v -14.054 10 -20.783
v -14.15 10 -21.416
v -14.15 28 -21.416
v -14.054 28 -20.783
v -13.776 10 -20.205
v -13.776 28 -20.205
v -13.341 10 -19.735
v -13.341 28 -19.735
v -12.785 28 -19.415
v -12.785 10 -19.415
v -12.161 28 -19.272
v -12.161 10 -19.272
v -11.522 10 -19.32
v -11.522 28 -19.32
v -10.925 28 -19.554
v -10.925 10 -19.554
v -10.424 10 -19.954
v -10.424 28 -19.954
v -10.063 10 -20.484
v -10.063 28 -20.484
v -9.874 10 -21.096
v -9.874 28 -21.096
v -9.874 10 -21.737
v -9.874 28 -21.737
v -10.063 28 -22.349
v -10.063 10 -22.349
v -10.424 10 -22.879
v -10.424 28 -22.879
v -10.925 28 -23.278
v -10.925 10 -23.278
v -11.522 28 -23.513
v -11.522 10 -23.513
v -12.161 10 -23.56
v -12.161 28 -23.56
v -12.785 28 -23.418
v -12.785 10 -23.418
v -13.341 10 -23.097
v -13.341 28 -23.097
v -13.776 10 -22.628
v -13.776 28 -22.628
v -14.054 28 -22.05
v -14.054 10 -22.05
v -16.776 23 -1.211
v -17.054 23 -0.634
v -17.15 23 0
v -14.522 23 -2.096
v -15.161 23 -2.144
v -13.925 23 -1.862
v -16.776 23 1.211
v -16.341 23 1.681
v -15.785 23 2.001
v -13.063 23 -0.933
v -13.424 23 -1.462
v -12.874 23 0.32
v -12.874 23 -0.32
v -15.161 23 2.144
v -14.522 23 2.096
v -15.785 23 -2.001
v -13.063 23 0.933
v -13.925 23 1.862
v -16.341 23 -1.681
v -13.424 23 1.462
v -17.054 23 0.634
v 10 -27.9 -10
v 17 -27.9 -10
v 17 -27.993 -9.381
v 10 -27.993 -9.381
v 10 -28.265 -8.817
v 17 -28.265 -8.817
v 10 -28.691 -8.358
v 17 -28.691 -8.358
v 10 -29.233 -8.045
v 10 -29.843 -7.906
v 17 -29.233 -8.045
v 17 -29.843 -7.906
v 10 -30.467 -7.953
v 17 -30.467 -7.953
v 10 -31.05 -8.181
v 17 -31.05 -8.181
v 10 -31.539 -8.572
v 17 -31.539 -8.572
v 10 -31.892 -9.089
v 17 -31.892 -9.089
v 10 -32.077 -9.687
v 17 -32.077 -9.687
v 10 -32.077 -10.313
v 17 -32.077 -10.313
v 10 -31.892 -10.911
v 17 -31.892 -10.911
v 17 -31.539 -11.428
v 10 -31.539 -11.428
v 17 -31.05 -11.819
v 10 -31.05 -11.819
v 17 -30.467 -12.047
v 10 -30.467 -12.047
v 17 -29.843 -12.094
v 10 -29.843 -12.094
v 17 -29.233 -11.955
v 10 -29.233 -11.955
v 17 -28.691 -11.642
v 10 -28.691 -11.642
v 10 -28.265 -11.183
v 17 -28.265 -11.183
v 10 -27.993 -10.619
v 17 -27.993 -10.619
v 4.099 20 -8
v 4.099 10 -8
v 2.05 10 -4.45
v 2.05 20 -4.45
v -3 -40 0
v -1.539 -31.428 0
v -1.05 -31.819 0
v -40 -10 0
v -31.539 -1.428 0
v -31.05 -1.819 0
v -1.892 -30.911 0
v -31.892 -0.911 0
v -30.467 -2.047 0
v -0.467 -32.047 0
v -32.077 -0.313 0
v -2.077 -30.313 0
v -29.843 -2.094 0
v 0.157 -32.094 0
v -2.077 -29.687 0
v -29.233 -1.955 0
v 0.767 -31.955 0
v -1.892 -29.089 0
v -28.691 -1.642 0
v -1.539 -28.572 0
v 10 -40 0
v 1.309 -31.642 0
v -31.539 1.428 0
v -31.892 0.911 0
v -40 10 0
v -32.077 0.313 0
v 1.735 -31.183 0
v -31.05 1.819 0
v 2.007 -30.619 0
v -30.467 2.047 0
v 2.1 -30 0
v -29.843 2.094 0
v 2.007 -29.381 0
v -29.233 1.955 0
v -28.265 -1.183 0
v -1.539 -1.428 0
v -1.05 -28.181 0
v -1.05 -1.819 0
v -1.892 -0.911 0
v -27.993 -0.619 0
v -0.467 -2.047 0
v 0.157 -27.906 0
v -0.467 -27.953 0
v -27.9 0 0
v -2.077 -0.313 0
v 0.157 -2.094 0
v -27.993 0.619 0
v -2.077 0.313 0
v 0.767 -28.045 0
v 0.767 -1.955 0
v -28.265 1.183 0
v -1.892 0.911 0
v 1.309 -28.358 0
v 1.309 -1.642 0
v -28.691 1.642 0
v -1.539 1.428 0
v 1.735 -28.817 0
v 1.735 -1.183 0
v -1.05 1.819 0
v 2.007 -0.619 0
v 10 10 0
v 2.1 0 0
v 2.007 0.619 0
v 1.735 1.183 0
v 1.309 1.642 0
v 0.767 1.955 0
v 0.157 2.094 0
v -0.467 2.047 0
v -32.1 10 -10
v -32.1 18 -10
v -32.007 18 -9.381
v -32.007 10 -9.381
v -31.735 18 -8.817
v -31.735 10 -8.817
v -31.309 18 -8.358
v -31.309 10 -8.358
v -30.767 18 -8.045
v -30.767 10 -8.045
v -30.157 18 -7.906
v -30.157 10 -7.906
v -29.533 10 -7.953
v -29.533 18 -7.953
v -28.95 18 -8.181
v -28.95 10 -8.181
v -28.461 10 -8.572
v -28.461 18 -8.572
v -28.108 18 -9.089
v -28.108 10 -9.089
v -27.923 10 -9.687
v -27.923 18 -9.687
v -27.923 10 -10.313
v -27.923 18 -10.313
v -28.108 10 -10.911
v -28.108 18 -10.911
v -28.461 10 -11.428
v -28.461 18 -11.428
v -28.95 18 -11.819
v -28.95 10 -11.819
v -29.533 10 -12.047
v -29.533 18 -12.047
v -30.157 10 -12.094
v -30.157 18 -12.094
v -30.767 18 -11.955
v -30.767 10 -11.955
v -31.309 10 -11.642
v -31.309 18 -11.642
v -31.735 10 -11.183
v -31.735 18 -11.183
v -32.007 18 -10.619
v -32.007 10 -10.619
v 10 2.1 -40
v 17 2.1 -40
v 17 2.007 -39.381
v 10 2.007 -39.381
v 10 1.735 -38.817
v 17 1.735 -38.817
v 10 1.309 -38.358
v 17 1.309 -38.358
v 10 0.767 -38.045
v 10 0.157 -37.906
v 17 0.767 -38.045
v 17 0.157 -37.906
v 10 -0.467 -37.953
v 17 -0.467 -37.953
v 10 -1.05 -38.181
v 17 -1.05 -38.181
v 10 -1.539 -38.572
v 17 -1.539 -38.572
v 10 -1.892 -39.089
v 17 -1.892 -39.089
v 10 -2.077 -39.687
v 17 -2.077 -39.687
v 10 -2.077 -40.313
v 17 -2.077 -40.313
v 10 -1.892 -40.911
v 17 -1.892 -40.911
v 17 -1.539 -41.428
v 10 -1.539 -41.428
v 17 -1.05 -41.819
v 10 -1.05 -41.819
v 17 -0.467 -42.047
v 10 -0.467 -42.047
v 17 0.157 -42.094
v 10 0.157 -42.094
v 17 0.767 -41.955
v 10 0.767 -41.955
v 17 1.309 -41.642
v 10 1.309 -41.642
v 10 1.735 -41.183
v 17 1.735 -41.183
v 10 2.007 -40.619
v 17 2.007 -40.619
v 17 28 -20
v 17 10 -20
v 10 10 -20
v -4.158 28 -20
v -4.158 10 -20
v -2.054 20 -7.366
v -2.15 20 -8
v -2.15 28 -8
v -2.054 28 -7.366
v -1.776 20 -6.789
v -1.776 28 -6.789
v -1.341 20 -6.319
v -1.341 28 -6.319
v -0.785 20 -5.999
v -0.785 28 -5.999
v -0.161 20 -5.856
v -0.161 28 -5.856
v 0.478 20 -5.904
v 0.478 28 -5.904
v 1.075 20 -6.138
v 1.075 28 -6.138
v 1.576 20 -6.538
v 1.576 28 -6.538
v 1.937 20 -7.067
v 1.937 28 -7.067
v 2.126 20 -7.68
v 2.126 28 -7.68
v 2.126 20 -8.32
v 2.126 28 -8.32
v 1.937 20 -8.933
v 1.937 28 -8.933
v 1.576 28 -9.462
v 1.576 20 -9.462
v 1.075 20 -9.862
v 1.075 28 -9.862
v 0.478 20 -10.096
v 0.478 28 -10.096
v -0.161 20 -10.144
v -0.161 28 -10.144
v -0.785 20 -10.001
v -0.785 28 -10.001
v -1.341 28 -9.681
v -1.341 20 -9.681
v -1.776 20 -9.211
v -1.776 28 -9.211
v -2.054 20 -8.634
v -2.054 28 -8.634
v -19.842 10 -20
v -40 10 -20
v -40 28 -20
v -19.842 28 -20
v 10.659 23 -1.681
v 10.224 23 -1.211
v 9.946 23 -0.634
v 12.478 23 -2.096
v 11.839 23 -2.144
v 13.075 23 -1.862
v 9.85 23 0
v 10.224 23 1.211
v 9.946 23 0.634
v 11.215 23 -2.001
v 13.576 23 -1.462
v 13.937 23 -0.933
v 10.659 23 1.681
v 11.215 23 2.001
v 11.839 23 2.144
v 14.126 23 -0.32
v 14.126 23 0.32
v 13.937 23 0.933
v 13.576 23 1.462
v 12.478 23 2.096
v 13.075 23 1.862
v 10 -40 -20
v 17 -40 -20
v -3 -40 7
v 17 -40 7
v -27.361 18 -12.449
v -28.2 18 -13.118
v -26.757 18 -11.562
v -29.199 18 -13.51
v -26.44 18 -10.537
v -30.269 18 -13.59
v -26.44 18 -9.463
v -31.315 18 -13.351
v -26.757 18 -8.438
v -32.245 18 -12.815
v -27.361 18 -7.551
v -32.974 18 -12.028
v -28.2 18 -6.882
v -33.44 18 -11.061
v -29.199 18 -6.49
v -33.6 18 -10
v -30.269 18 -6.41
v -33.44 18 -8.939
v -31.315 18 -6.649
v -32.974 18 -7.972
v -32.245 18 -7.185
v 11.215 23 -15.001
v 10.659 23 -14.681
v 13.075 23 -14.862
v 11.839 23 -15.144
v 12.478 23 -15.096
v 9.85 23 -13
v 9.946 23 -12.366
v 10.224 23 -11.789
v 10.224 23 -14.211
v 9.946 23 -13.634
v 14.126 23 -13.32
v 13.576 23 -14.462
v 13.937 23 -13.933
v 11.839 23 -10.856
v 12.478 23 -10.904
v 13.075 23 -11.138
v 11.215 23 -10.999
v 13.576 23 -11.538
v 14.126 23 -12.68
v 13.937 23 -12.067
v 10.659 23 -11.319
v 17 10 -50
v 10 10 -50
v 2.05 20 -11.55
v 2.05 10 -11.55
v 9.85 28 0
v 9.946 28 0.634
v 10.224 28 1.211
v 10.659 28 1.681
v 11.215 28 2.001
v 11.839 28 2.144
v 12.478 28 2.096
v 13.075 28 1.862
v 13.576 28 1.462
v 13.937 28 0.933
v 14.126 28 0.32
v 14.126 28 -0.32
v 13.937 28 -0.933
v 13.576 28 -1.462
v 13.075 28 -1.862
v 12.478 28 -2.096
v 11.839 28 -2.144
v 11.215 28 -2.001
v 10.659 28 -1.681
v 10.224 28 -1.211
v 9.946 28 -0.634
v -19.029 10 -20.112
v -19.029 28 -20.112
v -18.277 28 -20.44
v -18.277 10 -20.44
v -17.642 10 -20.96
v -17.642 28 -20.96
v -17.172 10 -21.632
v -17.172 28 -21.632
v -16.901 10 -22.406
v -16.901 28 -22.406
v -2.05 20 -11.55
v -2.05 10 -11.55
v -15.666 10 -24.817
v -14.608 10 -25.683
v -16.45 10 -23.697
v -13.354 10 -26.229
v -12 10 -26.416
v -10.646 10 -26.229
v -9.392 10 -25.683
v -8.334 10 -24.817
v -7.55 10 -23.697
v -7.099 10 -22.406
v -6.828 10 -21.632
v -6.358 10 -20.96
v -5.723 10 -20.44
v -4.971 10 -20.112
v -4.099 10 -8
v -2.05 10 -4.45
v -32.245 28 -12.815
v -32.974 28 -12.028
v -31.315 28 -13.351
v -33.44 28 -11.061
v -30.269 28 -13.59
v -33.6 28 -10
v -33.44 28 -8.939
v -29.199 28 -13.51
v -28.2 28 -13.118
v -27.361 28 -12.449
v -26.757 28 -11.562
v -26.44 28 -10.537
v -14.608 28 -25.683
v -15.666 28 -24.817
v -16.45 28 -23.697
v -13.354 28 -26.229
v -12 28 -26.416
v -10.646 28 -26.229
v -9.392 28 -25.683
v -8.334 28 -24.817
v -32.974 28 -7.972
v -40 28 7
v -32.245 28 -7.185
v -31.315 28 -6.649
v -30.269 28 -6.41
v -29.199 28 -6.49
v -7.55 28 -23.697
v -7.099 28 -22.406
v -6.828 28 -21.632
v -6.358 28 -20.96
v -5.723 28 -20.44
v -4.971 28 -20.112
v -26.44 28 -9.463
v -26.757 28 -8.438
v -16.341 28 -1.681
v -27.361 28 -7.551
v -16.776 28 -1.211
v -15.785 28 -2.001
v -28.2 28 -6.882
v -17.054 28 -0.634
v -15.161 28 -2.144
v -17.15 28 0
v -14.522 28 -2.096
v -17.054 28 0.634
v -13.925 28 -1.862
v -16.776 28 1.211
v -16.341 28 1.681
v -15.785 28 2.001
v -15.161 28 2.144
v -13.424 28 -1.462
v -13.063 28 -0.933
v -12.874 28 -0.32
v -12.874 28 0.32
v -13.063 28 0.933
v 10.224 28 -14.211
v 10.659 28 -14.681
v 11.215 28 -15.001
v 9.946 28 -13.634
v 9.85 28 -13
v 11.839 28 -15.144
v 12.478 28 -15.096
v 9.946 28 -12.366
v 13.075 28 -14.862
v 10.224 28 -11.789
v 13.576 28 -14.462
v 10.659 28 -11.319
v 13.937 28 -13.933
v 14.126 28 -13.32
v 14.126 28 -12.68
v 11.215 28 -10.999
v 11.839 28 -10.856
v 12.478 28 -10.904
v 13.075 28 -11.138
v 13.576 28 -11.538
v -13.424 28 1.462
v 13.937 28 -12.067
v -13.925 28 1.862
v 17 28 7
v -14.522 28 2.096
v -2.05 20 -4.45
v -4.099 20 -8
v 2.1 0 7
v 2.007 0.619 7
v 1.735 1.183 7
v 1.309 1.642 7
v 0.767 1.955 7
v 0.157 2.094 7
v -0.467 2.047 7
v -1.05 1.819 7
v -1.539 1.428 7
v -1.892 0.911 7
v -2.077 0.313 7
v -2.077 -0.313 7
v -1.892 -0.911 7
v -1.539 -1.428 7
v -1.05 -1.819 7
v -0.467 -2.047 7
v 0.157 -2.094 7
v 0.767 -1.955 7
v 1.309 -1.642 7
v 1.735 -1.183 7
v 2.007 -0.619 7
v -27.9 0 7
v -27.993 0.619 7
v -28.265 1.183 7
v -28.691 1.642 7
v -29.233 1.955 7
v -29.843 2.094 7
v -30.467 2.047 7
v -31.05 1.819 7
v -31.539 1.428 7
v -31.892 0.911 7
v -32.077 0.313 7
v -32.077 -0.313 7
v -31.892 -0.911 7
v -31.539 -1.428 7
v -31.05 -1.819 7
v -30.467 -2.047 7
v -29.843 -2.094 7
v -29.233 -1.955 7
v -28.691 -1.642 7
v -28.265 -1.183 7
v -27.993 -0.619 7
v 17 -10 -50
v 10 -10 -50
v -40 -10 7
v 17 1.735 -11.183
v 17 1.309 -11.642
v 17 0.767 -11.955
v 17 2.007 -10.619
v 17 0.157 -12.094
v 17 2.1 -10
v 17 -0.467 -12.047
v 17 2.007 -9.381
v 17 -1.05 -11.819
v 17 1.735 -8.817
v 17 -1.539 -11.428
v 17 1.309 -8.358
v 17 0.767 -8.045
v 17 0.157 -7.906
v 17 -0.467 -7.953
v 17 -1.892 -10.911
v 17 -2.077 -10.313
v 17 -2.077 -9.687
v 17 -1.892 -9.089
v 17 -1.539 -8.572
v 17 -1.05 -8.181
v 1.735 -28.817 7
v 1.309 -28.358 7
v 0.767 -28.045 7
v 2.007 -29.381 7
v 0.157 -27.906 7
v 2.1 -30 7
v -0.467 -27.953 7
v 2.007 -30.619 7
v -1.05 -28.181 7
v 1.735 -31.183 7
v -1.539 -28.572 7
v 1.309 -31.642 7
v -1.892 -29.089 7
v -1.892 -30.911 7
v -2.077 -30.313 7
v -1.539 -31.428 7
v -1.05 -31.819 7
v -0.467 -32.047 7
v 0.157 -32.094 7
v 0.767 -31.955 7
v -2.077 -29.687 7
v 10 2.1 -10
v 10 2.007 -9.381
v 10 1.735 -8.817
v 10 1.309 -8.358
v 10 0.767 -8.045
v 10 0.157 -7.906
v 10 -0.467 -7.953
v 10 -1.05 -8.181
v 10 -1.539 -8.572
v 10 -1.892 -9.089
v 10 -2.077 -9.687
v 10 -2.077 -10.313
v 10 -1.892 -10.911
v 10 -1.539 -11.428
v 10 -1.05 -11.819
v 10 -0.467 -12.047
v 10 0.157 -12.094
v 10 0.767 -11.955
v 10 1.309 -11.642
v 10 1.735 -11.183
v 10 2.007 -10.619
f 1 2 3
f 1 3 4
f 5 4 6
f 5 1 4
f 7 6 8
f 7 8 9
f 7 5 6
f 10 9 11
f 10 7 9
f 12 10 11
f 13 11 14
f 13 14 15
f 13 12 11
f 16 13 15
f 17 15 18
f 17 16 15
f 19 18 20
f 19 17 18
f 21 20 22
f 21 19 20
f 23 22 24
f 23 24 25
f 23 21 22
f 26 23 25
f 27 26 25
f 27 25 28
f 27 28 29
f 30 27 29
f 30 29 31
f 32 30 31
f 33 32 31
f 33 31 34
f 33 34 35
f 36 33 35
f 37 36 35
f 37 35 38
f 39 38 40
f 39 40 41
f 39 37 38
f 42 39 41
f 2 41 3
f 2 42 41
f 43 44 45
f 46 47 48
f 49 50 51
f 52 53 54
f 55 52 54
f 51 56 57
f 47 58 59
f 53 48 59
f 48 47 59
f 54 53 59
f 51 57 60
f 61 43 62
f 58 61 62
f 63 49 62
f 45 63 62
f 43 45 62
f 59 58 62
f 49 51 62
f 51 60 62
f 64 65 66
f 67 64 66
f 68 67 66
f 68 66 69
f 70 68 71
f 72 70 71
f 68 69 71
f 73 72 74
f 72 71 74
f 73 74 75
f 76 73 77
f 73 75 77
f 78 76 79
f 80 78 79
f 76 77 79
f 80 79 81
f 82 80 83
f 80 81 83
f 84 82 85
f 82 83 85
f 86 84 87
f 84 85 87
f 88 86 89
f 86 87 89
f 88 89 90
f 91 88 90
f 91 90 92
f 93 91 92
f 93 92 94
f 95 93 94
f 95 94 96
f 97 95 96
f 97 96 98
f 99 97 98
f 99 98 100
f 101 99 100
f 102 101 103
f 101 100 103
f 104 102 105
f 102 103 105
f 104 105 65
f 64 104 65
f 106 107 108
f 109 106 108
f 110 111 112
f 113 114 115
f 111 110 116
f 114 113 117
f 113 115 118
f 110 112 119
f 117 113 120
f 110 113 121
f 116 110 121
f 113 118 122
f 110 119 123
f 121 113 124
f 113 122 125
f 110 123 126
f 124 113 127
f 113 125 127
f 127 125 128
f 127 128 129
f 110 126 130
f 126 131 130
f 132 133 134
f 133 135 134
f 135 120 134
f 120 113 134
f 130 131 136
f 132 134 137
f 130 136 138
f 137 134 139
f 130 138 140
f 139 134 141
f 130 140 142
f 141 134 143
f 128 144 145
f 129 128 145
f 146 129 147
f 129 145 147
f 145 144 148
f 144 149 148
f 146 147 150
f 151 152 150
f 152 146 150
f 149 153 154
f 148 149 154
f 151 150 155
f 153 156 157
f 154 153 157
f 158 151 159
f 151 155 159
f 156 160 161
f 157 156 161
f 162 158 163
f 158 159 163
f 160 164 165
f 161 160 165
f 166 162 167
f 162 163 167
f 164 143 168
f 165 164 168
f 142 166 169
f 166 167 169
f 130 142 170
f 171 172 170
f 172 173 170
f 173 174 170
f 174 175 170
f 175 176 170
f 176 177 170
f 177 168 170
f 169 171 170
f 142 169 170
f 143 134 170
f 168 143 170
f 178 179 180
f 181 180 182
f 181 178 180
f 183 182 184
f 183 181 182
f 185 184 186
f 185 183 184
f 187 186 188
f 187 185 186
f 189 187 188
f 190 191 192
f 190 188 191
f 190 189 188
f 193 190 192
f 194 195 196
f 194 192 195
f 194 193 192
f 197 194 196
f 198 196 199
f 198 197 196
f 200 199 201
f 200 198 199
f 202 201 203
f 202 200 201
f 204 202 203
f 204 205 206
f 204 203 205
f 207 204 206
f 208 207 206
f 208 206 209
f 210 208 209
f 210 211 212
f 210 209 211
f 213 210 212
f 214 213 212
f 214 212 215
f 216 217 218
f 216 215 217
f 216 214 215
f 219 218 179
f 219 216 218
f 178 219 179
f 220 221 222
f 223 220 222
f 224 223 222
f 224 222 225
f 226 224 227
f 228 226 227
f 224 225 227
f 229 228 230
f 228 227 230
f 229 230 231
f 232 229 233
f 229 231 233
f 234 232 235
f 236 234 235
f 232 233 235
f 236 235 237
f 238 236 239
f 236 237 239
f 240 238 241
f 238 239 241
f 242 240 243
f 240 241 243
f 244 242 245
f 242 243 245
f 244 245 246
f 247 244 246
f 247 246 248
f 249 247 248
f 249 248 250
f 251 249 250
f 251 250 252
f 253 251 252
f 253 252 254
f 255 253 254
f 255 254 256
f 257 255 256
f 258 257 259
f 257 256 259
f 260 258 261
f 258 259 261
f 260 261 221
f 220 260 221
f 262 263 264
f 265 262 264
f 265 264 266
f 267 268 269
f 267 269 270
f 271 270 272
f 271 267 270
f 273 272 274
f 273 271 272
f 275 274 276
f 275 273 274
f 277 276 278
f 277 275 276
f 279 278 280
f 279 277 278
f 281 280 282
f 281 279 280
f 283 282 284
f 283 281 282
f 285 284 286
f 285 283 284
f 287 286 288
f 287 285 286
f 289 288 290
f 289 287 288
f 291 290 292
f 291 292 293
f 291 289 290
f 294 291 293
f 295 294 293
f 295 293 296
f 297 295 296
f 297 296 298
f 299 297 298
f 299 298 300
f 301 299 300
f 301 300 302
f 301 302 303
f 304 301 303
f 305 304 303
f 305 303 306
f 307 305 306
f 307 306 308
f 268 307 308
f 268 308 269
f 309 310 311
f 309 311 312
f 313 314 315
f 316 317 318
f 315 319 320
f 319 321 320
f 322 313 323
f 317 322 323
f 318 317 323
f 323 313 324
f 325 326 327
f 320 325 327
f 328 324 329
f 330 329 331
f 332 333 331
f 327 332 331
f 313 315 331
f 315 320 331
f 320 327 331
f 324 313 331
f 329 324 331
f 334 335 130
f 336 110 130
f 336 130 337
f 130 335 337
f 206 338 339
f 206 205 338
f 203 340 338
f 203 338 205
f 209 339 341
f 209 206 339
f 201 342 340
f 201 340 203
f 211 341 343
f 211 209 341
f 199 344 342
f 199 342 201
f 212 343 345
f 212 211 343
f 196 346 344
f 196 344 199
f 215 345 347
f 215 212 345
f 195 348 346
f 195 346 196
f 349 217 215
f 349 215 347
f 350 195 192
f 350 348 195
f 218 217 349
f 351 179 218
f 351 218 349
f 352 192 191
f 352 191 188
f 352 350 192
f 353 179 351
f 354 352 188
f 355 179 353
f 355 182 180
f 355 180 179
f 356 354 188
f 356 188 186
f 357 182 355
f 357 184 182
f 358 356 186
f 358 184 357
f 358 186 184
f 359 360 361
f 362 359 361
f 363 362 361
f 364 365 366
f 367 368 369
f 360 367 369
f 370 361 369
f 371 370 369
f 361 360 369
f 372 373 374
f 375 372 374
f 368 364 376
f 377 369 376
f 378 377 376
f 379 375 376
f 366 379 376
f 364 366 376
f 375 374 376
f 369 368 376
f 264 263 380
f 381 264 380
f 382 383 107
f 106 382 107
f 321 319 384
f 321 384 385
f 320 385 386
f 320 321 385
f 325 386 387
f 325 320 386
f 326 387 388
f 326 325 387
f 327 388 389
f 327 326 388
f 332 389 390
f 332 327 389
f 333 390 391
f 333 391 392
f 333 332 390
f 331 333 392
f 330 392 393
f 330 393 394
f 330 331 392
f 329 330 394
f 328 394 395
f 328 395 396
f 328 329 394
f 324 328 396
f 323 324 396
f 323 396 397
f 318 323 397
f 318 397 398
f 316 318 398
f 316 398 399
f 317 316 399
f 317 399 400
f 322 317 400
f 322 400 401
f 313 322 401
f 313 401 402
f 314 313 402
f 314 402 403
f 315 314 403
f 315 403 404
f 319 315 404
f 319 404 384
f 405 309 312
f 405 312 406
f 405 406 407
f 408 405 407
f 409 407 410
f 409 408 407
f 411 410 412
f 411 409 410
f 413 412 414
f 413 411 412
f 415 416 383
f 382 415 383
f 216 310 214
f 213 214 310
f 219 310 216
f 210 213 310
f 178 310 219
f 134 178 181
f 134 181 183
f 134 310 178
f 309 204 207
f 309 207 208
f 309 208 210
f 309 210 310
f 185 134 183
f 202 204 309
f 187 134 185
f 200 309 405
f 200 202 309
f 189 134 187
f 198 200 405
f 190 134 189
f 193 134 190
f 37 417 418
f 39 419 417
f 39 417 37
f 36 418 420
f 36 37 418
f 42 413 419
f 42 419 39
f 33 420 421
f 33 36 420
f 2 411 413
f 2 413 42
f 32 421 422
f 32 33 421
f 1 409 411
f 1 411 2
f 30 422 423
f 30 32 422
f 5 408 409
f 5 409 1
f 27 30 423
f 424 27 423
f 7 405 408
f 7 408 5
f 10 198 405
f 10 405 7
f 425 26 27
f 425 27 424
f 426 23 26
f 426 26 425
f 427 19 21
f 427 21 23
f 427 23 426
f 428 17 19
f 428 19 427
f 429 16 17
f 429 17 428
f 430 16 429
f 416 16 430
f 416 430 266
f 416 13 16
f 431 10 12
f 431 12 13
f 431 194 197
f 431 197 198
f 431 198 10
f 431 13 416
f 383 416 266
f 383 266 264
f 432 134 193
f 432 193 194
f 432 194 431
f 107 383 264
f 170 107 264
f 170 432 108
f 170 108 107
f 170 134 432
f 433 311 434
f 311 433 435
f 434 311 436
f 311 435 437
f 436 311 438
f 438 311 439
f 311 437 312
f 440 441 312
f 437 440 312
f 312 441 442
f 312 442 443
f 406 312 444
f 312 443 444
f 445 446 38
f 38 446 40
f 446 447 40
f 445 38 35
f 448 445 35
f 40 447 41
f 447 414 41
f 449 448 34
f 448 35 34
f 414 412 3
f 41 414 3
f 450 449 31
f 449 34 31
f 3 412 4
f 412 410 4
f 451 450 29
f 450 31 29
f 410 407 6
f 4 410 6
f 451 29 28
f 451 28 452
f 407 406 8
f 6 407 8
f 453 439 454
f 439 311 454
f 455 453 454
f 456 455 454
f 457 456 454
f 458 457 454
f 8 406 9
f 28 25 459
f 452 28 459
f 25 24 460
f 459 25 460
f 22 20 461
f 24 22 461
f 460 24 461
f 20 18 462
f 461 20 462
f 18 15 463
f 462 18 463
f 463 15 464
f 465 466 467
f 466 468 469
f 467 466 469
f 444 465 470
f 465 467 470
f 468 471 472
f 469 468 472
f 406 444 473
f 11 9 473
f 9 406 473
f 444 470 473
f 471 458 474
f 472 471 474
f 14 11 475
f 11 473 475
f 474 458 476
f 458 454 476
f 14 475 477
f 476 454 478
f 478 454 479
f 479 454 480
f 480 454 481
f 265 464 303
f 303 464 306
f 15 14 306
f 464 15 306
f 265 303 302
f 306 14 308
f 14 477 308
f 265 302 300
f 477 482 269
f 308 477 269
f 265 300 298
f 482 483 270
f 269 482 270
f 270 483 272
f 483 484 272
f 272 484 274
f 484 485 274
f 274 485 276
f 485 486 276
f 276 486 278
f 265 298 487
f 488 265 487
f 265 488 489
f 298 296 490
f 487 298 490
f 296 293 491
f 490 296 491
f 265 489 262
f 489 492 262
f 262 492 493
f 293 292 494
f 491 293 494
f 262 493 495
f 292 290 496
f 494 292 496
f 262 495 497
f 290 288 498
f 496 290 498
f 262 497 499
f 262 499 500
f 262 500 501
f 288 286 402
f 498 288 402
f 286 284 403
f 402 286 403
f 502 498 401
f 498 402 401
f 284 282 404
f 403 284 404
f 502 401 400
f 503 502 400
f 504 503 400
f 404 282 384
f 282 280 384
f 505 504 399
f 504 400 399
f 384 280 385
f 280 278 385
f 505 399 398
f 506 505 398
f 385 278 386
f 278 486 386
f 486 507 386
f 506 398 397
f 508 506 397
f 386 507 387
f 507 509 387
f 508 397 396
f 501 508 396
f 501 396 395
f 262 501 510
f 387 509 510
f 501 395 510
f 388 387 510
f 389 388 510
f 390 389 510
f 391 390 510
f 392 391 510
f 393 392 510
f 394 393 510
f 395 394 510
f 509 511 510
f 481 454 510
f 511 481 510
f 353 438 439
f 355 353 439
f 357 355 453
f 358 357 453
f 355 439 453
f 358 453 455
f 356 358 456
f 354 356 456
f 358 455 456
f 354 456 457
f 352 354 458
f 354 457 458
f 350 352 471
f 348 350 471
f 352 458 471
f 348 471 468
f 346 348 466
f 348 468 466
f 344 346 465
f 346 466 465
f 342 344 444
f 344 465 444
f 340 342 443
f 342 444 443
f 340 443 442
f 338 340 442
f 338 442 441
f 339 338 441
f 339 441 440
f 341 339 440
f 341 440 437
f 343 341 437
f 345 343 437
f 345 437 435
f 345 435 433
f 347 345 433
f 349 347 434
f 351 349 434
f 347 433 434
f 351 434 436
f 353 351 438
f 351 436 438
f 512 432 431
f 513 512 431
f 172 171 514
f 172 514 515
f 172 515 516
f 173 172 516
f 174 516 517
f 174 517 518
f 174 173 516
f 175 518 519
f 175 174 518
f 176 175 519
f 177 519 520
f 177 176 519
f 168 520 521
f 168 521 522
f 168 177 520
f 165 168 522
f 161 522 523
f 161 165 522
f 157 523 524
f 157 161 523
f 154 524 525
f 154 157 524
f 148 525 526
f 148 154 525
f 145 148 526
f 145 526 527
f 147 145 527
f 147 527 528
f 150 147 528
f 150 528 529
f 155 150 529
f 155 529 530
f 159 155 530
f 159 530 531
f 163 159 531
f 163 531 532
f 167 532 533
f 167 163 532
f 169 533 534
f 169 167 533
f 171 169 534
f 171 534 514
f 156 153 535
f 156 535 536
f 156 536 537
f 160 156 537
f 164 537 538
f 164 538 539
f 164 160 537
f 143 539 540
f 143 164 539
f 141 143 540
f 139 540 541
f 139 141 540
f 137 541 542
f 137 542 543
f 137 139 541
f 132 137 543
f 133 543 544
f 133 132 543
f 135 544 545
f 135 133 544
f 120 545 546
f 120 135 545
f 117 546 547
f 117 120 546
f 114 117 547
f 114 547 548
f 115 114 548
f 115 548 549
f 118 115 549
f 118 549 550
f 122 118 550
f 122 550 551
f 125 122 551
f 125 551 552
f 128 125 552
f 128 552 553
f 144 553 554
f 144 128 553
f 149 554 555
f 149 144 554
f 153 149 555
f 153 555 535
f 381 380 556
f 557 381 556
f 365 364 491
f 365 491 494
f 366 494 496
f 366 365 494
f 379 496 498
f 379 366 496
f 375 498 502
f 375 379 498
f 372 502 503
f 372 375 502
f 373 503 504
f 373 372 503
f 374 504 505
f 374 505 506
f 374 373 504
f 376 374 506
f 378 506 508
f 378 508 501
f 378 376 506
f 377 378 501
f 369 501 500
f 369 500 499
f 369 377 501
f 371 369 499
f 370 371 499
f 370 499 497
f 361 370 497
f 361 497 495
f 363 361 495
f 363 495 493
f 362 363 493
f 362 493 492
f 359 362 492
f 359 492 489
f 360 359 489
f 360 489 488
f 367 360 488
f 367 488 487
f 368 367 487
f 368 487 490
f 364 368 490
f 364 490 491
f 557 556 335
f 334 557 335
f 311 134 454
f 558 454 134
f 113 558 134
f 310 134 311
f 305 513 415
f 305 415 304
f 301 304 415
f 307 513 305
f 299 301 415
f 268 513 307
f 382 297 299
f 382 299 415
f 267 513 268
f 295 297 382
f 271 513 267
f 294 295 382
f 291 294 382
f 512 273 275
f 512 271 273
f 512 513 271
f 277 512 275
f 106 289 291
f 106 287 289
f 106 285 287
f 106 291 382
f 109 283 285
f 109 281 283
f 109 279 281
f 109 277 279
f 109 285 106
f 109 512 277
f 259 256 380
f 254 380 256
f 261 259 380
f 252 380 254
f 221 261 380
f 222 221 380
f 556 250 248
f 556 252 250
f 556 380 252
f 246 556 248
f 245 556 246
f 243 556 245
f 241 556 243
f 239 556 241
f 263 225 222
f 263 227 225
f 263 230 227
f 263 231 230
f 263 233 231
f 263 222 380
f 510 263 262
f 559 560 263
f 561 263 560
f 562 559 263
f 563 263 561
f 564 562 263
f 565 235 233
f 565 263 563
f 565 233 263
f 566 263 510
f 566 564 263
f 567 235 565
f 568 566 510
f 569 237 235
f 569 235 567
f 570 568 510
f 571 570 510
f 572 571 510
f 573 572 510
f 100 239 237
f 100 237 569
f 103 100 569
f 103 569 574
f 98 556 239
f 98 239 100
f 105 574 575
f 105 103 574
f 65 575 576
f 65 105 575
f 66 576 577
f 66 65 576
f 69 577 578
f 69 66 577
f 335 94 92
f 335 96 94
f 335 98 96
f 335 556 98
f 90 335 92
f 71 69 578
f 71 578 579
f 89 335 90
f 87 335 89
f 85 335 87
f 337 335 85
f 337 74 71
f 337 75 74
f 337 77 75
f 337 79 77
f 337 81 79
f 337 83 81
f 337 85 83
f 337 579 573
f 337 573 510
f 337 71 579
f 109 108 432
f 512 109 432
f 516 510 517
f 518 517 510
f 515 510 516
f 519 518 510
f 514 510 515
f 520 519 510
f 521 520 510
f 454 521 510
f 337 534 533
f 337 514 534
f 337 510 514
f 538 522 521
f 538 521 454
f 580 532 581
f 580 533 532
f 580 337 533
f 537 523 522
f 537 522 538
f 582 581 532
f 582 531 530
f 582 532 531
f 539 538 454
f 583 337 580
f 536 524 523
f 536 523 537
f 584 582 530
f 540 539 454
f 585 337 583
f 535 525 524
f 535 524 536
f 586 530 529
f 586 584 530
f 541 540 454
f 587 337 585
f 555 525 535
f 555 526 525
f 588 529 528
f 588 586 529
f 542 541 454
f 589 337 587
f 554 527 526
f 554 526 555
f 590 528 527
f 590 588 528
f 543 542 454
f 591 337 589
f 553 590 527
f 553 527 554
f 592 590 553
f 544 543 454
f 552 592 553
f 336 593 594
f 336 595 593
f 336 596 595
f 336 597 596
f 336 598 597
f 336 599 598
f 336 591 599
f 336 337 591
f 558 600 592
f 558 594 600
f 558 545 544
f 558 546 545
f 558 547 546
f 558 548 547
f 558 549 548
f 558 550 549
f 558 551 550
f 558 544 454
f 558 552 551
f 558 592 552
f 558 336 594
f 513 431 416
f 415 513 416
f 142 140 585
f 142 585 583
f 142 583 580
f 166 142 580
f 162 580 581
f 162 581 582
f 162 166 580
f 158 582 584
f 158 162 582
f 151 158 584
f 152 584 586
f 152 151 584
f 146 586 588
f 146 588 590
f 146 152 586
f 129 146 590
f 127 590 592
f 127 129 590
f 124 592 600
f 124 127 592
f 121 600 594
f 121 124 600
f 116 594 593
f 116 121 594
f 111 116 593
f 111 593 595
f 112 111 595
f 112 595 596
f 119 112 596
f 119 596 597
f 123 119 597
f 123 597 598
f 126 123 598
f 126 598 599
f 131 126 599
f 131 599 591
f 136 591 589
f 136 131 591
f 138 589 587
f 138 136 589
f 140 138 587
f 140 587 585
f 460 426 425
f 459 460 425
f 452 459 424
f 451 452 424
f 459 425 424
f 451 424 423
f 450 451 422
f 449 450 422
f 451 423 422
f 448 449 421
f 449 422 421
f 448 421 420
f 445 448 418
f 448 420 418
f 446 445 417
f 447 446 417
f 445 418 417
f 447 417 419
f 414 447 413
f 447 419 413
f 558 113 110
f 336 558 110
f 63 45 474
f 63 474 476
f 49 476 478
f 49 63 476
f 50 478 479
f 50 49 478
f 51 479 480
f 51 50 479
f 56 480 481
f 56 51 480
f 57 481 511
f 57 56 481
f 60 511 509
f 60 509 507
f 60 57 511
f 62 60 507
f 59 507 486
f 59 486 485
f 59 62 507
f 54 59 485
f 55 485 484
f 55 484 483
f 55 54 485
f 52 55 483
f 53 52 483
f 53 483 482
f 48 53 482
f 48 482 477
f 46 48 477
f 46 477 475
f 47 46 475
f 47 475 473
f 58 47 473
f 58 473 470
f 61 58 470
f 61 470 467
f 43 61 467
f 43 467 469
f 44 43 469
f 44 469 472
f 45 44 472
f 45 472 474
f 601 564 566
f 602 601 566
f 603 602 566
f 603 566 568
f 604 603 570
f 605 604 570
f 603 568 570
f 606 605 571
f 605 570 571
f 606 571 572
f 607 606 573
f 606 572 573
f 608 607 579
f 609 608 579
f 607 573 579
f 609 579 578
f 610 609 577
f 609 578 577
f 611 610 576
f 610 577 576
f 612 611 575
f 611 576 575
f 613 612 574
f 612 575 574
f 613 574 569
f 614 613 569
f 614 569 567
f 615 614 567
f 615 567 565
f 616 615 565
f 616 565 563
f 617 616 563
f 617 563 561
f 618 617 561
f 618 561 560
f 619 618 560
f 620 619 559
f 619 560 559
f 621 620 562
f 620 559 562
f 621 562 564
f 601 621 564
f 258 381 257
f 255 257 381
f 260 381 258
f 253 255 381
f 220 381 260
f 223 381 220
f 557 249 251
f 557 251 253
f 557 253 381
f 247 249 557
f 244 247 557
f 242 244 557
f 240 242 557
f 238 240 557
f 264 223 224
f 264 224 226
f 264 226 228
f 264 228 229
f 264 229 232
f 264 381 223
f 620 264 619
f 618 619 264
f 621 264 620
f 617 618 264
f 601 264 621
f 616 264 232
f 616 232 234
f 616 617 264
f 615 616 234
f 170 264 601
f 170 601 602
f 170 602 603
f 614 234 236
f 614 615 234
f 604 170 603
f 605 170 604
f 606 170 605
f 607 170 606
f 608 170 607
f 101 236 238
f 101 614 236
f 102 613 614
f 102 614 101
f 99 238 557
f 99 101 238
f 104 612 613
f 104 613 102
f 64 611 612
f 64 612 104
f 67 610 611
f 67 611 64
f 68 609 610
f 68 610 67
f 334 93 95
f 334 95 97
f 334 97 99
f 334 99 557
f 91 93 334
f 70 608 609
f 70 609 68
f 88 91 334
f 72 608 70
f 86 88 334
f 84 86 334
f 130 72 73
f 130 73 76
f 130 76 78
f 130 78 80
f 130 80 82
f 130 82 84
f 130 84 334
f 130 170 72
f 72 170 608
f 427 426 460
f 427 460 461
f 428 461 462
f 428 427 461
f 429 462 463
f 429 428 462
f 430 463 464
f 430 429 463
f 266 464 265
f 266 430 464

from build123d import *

# Parameters (mm, degrees)
SKETCH_R        = 2.1
PAD_DEPTH       = 7
SKETCH001_R     = 2.1
PAD001_DEPTH    = 7
SKETCH002_R     = 2.1
SKETCH002_R_2   = 2.15
PAD002_DEPTH    = 18
SKETCH003_R     = 2.15
PAD003_DEPTH    = 13
SKETCH004_R     = 3.6
POCKET_DEPTH    = 10
POCKET001_DEPTH = 10


with BuildPart() as part:
    # Sketch → Pad (new body)
    with BuildSketch(Plane.XY):
        Polygon((-40, 10), (-40, -10), (-3, -40), (17, -40), (17, 10), align=None)
        Circle(SKETCH_R, mode=Mode.SUBTRACT)
        with Locations((0, -30)):
            Circle(SKETCH_R, mode=Mode.SUBTRACT)
        with Locations((-30, 0)):
            Circle(SKETCH_R, mode=Mode.SUBTRACT)
    extrude(amount=PAD_DEPTH)

    # Sketch001 → Pad001 (new body)
    with BuildSketch(Plane.YZ.offset(17)):
        Polygon((10, 0), (10, -50), (-10, -50), (-40, -20), (-40, 0), align=None)
        with Locations((0, -10)):
            Circle(SKETCH001_R, mode=Mode.SUBTRACT)
        with Locations((0, -40)):
            Circle(SKETCH001_R, mode=Mode.SUBTRACT)
        with Locations((-30, -10)):
            Circle(SKETCH001_R, mode=Mode.SUBTRACT)
    extrude(amount=-PAD001_DEPTH)

    # Sketch002 → Pad002 (new body)
    with BuildSketch(Plane(origin=(0, 10, 0), x_dir=(-1, 0, 0), z_dir=(0, 1, 0))):
        with BuildLine():
            Line((-17, 7), (40, 7))
            Line((40, 7), (40, -20))
            Line((40, -20), (19.841684, -20))
            ThreePointArc((19.841684, -20), (17.941895, -20.678202), (16.901061, -22.406155))
            ThreePointArc((7.098939, -22.406155), (12, -26.416408), (16.901061, -22.406155))
            ThreePointArc((7.098939, -22.406155), (6.058105, -20.678202), (4.158316, -20))
            Line((-17, -20), (4.158316, -20))
            Line((-17, -20), (-17, 7))
        make_face()
        with Locations((30, -10)):
            Circle(SKETCH002_R, mode=Mode.SUBTRACT)
        with Locations((-12, -13)):
            Circle(SKETCH002_R_2, mode=Mode.SUBTRACT)
        with Locations((15, 0)):
            Circle(SKETCH002_R_2, mode=Mode.SUBTRACT)
        with Locations((-12, 0)):
            Circle(SKETCH002_R_2, mode=Mode.SUBTRACT)
        with Locations((0, -8)):
            Circle(SKETCH002_R_2, mode=Mode.SUBTRACT)
        with Locations((12, -21.416408)):
            Circle(SKETCH002_R_2, mode=Mode.SUBTRACT)
    extrude(amount=PAD002_DEPTH)

    # Sketch003 → Pad003 (new body)
    with BuildSketch(Plane.XZ.offset(-10)):
        with Locations((-15, 0)):
            Circle(SKETCH003_R)
        with Locations((12, 0)):
            Circle(SKETCH003_R)
        with Locations((12, -13)):
            Circle(SKETCH003_R)
    extrude(amount=-PAD003_DEPTH)

    # Sketch004 → Pocket (cut)
    with BuildSketch(Plane(origin=(0, 28, 0), x_dir=(-1, 0, 0), z_dir=(0, 1, 0))):
        with Locations((30, -10)):
            Circle(SKETCH004_R)
    extrude(amount=-POCKET_DEPTH, mode=Mode.SUBTRACT)

    # Sketch005 → Pocket001 (cut)
    with BuildSketch(Plane.XZ.offset(-10)):
        Polygon((2.049593, -11.55), (4.099187, -8), (2.049593, -4.45), (-2.049593, -4.45), (-4.099187, -8), (-2.049593, -11.55), align=None)
    extrude(amount=-POCKET001_DEPTH, mode=Mode.SUBTRACT)


solid = part.part
